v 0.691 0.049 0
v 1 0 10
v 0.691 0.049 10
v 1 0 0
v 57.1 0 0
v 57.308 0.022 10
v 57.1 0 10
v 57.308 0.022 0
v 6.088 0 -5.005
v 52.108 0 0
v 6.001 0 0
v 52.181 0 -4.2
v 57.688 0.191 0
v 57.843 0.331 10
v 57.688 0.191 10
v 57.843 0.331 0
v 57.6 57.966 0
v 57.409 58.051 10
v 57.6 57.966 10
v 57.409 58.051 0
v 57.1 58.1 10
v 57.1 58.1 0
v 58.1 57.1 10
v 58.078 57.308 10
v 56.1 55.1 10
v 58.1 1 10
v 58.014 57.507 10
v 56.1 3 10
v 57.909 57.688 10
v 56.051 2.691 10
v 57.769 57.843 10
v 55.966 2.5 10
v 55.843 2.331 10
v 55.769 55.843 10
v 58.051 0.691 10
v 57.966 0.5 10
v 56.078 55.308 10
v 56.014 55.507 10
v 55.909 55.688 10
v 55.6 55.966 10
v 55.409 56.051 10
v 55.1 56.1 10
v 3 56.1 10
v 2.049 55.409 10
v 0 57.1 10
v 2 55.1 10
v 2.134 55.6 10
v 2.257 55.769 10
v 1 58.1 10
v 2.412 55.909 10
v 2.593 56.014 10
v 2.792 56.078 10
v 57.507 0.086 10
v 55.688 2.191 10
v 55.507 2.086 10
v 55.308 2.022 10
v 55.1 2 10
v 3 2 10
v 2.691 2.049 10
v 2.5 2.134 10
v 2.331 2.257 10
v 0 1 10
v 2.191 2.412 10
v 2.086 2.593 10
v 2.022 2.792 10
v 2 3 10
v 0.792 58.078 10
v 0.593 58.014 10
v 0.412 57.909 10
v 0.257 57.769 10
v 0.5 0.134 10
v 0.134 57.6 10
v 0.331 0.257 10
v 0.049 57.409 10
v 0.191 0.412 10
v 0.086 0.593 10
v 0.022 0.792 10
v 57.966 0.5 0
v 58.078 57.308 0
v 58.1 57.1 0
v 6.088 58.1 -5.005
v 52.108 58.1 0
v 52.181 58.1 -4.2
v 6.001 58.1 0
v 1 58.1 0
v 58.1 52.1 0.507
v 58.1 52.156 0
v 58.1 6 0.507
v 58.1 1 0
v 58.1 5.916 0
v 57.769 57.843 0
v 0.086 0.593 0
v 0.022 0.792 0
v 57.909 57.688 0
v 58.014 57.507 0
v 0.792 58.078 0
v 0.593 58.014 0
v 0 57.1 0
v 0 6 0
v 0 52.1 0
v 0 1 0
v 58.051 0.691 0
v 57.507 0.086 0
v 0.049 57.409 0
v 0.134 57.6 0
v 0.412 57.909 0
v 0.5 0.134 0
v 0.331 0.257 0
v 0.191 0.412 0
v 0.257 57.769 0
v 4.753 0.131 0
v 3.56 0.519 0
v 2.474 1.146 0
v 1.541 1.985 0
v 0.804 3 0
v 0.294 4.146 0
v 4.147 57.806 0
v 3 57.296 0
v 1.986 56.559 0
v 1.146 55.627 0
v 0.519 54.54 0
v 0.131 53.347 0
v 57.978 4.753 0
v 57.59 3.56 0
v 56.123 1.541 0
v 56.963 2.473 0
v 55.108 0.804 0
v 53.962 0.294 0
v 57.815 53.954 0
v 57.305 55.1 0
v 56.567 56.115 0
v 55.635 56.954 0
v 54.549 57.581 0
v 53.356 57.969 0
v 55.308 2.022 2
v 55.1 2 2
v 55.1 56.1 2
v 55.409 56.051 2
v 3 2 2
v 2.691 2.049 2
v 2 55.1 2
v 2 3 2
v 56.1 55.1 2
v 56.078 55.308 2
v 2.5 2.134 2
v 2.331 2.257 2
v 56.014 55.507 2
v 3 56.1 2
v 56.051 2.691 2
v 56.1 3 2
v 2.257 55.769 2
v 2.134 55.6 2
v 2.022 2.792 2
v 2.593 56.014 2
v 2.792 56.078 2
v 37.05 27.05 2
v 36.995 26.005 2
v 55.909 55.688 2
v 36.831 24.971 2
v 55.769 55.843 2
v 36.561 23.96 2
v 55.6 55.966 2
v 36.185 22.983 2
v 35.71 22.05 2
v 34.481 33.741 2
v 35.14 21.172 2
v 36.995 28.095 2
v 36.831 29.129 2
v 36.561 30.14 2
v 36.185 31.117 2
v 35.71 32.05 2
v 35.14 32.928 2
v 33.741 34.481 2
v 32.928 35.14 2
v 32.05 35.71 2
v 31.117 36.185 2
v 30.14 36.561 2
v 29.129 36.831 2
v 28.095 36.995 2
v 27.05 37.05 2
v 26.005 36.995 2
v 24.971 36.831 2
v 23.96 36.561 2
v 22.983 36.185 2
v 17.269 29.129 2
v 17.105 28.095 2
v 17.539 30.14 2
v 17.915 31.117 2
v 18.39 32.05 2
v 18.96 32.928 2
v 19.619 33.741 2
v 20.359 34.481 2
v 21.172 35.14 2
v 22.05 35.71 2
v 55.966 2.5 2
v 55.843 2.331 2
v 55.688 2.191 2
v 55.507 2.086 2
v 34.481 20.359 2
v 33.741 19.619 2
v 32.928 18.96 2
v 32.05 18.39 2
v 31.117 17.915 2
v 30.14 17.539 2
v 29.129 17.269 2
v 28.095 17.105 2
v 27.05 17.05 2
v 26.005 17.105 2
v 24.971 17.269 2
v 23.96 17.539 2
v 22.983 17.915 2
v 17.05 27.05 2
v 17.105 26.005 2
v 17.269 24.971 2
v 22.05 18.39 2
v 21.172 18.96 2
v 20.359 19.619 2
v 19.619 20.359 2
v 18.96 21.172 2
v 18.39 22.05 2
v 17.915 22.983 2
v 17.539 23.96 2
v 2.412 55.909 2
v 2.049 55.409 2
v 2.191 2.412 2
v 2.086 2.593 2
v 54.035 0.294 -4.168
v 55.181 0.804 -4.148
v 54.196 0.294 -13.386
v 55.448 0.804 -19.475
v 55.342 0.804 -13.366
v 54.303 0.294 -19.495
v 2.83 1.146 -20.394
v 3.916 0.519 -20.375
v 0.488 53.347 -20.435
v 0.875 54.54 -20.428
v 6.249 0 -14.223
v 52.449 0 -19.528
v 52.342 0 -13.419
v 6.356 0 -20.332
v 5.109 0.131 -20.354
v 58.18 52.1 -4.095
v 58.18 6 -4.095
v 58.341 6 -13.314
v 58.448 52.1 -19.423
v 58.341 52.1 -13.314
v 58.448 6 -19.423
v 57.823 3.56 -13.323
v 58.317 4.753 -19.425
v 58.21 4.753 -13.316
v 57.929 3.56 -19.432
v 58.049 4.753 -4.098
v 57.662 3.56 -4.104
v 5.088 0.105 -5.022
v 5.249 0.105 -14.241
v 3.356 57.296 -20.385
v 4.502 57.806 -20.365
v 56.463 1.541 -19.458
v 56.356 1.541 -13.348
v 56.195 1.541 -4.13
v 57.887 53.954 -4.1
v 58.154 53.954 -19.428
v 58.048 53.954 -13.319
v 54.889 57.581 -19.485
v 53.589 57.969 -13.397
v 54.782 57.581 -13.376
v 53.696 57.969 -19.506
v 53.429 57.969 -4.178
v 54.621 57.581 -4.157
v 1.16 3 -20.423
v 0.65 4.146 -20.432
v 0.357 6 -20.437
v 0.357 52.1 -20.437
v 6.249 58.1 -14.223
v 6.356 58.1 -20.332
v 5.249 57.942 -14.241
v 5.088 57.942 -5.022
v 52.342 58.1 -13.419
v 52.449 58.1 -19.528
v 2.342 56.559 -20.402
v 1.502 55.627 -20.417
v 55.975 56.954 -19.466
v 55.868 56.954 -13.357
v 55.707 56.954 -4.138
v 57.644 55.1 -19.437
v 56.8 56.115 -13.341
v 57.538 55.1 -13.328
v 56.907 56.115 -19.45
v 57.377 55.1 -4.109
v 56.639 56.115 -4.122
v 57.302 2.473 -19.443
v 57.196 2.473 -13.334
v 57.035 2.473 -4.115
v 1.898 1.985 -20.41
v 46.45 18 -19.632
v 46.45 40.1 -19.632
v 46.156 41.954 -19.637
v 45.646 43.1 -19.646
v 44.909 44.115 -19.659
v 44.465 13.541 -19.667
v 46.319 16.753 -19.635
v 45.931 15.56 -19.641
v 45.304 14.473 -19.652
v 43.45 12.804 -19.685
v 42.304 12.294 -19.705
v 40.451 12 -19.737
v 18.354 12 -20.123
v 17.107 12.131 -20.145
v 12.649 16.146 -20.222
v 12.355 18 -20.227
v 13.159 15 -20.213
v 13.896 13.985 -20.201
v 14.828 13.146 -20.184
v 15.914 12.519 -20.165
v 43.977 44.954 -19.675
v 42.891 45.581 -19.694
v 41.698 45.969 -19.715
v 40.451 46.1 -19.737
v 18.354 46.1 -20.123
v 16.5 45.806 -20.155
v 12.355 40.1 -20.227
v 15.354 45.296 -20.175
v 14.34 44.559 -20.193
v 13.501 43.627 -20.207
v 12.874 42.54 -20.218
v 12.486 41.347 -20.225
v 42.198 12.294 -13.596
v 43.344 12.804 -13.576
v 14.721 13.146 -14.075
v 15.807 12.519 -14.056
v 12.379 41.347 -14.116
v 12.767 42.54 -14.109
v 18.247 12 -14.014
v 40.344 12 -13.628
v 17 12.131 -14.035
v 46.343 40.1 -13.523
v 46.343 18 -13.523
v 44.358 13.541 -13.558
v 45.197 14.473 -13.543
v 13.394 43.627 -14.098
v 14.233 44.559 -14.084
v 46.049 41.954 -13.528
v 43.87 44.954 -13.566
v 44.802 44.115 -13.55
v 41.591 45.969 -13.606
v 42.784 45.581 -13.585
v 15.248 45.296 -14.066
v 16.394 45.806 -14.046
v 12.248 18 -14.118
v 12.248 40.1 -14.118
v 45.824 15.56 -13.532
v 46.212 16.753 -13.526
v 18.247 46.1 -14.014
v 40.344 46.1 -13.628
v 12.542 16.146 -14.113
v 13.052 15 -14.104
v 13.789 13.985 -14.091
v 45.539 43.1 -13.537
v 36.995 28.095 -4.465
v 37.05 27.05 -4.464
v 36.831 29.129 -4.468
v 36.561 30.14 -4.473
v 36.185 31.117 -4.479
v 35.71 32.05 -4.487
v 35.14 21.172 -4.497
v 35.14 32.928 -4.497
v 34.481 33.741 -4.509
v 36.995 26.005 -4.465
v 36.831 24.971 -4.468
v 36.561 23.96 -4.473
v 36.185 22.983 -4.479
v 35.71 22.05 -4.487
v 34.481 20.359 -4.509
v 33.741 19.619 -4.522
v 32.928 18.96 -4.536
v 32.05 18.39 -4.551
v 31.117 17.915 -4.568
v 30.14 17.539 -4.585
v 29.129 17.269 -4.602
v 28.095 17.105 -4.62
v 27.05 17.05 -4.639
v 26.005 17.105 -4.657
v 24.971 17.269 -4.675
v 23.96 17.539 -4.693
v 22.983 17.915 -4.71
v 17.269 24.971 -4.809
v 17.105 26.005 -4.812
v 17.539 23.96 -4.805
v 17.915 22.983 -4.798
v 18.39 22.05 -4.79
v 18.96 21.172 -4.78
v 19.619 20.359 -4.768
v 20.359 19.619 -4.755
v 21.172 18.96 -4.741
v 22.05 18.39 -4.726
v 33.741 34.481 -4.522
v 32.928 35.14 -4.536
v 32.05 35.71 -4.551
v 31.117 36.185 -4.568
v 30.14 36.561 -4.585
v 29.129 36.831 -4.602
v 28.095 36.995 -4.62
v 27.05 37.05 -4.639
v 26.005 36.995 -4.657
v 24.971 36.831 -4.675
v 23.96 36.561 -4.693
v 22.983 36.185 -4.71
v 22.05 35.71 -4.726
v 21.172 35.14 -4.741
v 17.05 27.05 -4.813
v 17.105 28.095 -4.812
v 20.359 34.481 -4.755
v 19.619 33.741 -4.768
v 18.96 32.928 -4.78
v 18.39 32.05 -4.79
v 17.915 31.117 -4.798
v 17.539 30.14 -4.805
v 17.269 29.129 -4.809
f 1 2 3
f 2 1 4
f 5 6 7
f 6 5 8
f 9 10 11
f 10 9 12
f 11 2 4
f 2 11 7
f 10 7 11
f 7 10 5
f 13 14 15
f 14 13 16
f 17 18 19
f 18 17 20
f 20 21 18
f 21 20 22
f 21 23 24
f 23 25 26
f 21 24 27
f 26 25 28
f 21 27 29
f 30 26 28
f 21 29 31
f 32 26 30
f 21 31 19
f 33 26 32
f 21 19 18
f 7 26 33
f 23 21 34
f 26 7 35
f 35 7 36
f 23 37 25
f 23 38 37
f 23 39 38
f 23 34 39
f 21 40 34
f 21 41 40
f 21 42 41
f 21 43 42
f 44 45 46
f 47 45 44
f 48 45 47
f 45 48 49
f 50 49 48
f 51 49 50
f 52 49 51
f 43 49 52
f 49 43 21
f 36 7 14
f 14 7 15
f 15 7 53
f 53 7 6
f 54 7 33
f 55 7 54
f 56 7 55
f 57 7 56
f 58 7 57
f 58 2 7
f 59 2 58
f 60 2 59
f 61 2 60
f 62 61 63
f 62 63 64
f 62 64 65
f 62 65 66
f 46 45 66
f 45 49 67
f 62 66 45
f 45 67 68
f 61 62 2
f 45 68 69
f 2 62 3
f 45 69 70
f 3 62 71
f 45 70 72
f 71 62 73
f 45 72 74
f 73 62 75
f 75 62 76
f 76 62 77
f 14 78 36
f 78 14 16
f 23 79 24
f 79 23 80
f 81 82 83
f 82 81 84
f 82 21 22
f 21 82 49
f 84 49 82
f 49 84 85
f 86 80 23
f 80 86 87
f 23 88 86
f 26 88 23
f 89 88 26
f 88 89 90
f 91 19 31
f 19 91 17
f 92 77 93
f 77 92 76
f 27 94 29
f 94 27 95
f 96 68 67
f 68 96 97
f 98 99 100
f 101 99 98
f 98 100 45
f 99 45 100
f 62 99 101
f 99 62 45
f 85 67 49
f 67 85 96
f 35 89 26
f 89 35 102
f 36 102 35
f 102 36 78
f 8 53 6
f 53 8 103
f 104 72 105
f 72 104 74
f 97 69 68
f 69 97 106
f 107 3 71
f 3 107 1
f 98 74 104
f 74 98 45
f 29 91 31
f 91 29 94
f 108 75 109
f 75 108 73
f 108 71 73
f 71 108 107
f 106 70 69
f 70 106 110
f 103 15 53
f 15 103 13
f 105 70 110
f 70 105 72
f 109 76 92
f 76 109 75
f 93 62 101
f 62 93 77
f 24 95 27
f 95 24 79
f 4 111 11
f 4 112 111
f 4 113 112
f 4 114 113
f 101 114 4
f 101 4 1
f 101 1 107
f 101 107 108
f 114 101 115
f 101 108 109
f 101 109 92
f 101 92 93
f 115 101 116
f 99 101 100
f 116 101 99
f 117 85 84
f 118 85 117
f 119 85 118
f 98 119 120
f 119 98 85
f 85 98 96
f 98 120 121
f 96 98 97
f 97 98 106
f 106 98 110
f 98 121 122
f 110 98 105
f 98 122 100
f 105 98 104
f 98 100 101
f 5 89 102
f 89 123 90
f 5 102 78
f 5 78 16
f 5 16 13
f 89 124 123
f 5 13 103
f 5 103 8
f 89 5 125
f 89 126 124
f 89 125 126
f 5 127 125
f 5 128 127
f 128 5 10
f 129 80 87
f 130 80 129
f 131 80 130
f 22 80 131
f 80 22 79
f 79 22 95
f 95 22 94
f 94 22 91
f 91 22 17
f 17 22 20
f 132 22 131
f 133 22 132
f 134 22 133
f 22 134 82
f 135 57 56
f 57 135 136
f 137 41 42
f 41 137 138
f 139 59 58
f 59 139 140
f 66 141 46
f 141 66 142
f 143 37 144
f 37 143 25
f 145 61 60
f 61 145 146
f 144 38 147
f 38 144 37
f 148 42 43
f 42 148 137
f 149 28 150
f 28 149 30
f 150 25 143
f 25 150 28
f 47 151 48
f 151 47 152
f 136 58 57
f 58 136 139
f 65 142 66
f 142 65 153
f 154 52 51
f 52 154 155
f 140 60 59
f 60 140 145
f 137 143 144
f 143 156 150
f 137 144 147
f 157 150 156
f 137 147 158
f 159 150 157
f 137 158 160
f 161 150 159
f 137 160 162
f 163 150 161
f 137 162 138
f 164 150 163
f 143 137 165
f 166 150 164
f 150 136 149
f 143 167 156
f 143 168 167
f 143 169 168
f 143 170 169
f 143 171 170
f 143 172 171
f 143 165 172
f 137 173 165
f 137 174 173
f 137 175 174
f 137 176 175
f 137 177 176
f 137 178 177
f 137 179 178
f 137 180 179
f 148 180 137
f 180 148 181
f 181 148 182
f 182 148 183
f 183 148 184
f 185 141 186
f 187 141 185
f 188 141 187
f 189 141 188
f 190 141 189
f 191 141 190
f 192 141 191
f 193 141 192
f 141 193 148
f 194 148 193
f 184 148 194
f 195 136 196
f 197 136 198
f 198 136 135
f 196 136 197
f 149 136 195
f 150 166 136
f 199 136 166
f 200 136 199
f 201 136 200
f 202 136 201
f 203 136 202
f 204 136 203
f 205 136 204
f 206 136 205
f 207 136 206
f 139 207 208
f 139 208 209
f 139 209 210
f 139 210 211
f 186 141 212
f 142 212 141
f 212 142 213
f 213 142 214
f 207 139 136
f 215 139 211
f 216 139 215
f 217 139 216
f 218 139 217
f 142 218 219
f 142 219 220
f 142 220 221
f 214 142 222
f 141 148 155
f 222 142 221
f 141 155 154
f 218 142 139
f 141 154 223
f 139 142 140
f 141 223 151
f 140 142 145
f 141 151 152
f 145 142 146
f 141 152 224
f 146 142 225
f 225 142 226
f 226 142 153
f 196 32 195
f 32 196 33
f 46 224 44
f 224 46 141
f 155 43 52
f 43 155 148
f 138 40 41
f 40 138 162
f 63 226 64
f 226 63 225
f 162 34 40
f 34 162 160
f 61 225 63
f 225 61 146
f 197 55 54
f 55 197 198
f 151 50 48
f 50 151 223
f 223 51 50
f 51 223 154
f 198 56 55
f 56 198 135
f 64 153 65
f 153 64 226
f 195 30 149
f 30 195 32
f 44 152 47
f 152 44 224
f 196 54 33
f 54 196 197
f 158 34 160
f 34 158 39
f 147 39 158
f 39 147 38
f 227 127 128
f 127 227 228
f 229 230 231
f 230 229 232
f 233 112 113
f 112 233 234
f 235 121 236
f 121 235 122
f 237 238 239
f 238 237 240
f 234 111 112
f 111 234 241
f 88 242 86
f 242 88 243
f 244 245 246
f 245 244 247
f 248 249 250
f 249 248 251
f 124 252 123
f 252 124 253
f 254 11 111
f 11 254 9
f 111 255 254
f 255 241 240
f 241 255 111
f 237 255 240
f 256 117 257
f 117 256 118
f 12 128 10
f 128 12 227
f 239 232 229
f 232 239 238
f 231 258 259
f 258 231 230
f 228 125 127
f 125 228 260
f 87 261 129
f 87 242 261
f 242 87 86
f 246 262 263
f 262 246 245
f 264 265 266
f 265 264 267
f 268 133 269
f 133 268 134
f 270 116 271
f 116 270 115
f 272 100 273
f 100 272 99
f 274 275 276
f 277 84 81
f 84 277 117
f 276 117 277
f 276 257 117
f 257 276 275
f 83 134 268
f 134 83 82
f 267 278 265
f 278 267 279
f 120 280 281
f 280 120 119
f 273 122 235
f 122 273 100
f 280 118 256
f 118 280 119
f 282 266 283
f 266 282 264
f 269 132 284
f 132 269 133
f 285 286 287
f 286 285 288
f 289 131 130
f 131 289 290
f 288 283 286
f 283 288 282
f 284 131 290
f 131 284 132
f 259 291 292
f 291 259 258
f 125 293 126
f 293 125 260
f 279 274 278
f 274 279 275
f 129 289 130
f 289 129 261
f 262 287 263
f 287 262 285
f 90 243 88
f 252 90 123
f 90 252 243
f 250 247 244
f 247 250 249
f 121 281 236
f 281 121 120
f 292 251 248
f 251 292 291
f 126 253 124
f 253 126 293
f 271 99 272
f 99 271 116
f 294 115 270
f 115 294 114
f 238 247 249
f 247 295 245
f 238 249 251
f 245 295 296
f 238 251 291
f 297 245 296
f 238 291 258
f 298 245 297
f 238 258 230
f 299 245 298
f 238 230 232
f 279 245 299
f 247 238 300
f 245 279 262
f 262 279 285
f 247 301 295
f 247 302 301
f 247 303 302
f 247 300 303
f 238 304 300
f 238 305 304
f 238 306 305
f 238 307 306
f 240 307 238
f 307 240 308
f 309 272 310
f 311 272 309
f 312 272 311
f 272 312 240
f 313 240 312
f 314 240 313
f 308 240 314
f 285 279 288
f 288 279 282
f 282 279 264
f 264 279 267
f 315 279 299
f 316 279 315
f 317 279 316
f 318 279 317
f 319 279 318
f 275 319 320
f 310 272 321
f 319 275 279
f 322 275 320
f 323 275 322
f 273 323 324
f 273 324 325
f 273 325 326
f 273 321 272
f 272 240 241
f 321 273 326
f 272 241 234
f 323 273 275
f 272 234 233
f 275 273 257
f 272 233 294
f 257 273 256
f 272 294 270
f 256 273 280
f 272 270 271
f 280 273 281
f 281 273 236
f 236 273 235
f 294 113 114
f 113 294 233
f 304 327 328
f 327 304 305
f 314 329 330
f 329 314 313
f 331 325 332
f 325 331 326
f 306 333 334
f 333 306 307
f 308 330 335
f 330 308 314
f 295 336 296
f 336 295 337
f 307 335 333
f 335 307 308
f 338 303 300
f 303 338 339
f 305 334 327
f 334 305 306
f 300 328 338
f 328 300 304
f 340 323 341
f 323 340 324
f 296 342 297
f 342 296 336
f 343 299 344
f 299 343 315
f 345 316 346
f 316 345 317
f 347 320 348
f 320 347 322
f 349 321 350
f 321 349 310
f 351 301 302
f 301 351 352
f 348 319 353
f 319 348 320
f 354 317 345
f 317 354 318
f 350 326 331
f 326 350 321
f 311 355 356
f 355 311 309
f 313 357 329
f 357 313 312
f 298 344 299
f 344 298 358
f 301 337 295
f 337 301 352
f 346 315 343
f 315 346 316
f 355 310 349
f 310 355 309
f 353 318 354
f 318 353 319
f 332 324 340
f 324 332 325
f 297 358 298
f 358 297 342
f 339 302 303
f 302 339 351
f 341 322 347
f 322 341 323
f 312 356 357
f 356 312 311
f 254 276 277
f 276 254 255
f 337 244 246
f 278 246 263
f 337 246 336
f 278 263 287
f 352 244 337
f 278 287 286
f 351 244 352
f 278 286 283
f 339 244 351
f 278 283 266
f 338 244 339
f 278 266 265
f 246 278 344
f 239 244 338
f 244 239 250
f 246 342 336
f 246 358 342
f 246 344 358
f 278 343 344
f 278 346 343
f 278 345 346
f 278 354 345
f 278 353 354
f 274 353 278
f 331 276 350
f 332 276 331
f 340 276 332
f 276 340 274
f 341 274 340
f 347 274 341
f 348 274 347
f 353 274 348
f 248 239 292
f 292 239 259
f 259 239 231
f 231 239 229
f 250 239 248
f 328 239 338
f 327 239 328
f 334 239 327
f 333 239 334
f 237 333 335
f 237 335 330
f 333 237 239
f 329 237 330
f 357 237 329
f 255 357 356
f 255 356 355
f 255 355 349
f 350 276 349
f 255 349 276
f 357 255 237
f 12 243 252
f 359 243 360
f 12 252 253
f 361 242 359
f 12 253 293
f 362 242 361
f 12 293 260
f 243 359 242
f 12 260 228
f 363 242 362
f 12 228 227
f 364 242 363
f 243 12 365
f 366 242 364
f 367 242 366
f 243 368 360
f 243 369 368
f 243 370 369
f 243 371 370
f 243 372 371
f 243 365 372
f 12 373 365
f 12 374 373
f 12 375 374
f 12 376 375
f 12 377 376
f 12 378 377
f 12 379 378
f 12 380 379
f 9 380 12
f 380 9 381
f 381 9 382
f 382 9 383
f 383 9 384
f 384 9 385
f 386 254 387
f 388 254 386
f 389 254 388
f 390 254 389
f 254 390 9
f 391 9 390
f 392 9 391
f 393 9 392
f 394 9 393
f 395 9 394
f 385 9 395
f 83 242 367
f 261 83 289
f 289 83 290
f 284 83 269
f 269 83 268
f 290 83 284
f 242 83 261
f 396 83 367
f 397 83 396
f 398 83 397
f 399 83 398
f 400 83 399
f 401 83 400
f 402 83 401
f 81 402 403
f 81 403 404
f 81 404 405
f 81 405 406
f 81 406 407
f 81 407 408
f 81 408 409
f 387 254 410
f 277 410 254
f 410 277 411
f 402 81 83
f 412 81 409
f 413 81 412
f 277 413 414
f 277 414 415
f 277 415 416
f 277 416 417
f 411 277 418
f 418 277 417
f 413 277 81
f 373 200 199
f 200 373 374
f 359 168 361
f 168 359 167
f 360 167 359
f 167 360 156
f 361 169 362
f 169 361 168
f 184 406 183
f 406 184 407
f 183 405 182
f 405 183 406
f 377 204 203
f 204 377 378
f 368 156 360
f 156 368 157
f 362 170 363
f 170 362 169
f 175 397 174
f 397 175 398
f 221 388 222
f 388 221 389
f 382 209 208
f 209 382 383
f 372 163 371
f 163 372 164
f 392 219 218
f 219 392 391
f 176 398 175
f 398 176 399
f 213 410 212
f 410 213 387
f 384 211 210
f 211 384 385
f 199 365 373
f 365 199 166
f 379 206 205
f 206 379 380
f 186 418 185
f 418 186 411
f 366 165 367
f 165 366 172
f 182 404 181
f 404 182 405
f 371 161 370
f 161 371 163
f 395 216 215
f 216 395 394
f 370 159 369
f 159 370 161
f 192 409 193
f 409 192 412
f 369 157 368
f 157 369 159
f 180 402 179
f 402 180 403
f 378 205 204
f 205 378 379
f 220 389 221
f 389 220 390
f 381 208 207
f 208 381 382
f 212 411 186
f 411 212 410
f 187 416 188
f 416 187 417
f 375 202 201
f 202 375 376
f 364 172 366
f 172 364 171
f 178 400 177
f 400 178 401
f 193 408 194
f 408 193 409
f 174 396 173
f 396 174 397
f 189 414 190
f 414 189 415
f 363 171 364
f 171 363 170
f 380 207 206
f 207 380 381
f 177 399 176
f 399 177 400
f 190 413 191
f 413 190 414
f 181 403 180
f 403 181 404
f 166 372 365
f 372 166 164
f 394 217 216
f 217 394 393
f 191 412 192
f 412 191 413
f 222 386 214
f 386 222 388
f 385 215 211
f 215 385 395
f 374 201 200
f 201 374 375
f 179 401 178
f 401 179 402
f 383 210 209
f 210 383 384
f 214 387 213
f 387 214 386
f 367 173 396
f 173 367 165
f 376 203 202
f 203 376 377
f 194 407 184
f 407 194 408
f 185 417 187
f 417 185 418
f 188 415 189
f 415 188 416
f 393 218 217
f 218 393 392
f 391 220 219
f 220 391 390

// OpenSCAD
// file: myTools.scad
module tube (r = 0, d = 0, l = 0, thick = 0, centered = true, taper_pct = 0, circlip = false) // r=radius d=dia l=length 
{
    assert( r != 0 || d != 0, "specify one of radius or diameter");
    assert( l != 0 , "tube: need length 'l' to be non zero");
    assert( thick != 0, "wall thickness cannot be zero");

    punch = $preview ? .2 : 0; // stop funny view artifact

    dia = r ? r * 2 : d;

    od = ((thick > 0) ? dia + thick * 2 : dia);
    id = (thick > 0) ? dia             : dia  + thick *2; 

    
    
    if (thick > 0)
        echo ("tube\tMIN id = ", id, "od = ", od, "wall = ", thick, "center= ", centered);
    else
        echo ("tube\tMAX od = ", od, "id = ", id, "wall = ", thick, "center= ", centered);

    echo ("tube\tHeigth = ", l);
        
    if (taper_pct != 0)
    {
        echo ("tube\t*** OD expanded by ", taper_pct, "%, : bottom od = ", od * (1. +taper_pct/100), "top od = ", od);
    }
    
    assert(dia || dia < 0, "tube : missing r or d ");
    
    // if taper_pct specified, the base will always be closest to 0,0,0
    translate([ 0, 0, taper_pct == 0 ? 0: centered ? l/2:l  ])
    rotate([0, taper_pct == 0 ? 0 : 180, 0 ])

    difference()
    {
        // make a reese's cup
        {
            color("YELLOW", .3)
            linear_extrude(height= l, scale = 1 + taper_pct/100)
                difference()
                {
                    circle(d = od);
                    circle(d = .5);
                }
        }
    
     // hollow out reessed cup
     color("GREEN")
     translate([0, 0, -punch/2])
     linear_extrude(height= l+ punch*2, $fn=100)
     {
        circle(d = id);
        if (circlip) #square([1 + punch, od ]);
     }
    
    }
}
        
module abox (dims, thick = 0, centered = true, bRoundOut = true, bRoundIn = false, bSolid = false)
{
    punch = $preview ? .1 : 0; // stop funny view artifact
    
    assert(thick != 0, "Thick must be specified. +=outside dim, -= inside dims");
    assert(dims.z > thick, "wall thickness too large for depth of box");

    wall2 = abs(thick) * 2; // 2 walls in each direction
    wall = wall2 / 2;
    
    // box either grows inward (thick < 0) or outward (thick > 0)  from dims
    fat = dims + [ wall2, wall2, wall];
    thin = dims - [ wall2, wall2, wall];
    
    offset = (thick > 0 && centered == false) ? wall : 0;
    
    //echo ("abox : adjusting x,y,z by ", offset, " to move origin from  center to 0,0,0");
    translate( [ centered ? 0 : dims.x /2 + offset, centered ? 0 : dims.y /2 + offset, centered ? 0 : dims.z /2 + offset/2]) 
    {
        if (thick > 0)
        {   
            // wall grows outwards from users dim
            echo ("making a box, MAX INSIDE dim = ", dims, "a wall=", thick, "mm ... max outside = ", fat, " mm");
        }
        else
        {
            // wall grows inward from users dime
            echo ("making a box, MAX OUTSIDE dim = ", dims, "a wall=", thick, "mm ... min inside = ", thin, " mm");
        }
        
        // linear extrude alway works in the positive x/y plane an goes upward.
        // after calc, re-center about 0,0,0 where a centered cube would be
        
        translate([ 0, 0, thick > 0  ? -fat.z/2 : -dims.z/2 ])
        difference()
        {
            router_outside = bRoundOut ? wall : 0;
            x = thick > 0  ? fat.x : dims.x;
            y = thick > 0  ? fat.y : dims.y;

            color("YELLOW", .2)

            // using 'offset' it will add r on all dimensions, then round., so it you want
            //      now you have fatter perimeter than you stared with, but corners are round.
            //      compensate by shrinking dimension by r, calling offset then will put it back include      for bRoundOut, subtract 'r' knowing expansion will happen.

            linear_extrude(thick > 0  ? fat.z : dims.z)
            if (bRoundOut)
            {
                offset( r= wall/2, $fn=30)
                square( [x - router_outside, y - router_outside], true);
            }
            else square( [x - router_outside, y - router_outside], true);
           
            if (bSolid == false)
            {
                // punching out inside. its either dims or thin.
                router_inside = bRoundIn ? wall : 0;
                xi = thick > 0  ? dims.x : thin.x;
                yi = thick > 0  ? dims.y : thin.y;

                color("GREEN")
                translate([ 0,0, wall]) // make sure the box has a bottom.
                linear_extrude(thick > 0  ? fat.z - wall + punch : dims.z - wall + punch)
                if (bRoundIn) 
                {
                    offset( r= wall/2, $fn=30)
                    square( [ xi - router_inside, yi - router_inside], true);
                }
                else
                    square( [ xi, yi], true);
            }
        }
    }
 }


// 50x25x10 box walls grow inward (-2). on center origin midpoint
// rounded outside (default), sharp corner inside(default), centered about 0,0,0
//color("GREEN", .9)
//abox([50,25, 10], -2, true); 

/*
// 50x25x10 box walls grow inward (-2). on center origin midpoint
// sharp outside corners, rounded inside corners. Sit on x,y plane
color("BLUE", .9)
abox([50,25, 10], -2, bRoundOut=false, bRoundIn=true, centered = false);  // 50x25x10 box inside dim origin has 0,0

// 50x25x10 box walls grow inward (-2). on center origin midpoint
// sharp corners inside and out. sits on x,y plane
color("GREY", .9)//
translate([ 55, 0, 0])      
abox([50,25, 10], +2, bRoundOut=false, bRoundIn=false, false); // 50x25x10 box outside dim origin is 0,0
*/

// 50x25x10 box walls grow inward (-2). on center origin midpoint
// round corners outside and SOLID
color("BLUE", .9)//
translate([ 55, 0, 0])      
abox([50,25, 10], +2, bRoundOut=true, bRoundIn=false, false, bSolid = true); // 50x25x10 box outside dim origin is 0,0


//translate ([-30,-30, 0])
{
/*
    // tube outer dia  20, inner dia = (20 - 8)
    color("PINK")
    tube (d = 20, l = 20, thick = -8, centered = false);

    // tube, inner dia = (2* 10), outer dia = ((2*10) + 2) 
    color("PURPLE", .3)
    tube (r = 10, l = 20, thick = +2, centered= true);
*/

    tube (d = 60, l = 20, thick = -6, centered = false);

    translate([0, 0, 50])
    tube (d = 60, l = 20, thick = -6, centered = false, taper_pct = 20, circlip = true);
    //color("GREEN")
    //tube (d = 20, l = 20, thick = -2, centered = false, taper = 10, circlip = true);


}
// main file
//use <otherPeoplesWork/threads-scad/threads.scad>
use <myTools.scad>
punch = $preview ? 2: 0;

x = 54.1;
y = x;
z = 8;

wall = +2;


/* [Hidden] */
$fn=60;   //circle quantize 360/10=36 degrees per side
M5_outside = [ x, y, 8];
M5_middle = [ x/2, y/2, z/2];

module hi_level()
{
    abox( M5_outside, thick = +2, bRoundOut=true, bRoundIn=true, centered = false);
    HOOK_THICK = 3;
    HOOK_OPEN = 8.22 + .5;
    HOOK_outside = [ x, y, HOOK_OPEN *2 + HOOK_THICK];

    rotate([0, 179, 0]) // 179 tilt 1 degree in 
    translate([-(x + wall*2), 0, 0])
    difference()
    {
        color("GREEN")
        abox( HOOK_outside + [ wall *2, wall*2, 0] , thick= -12, bRoundOut=true, bRoundIn=true, centered = false);  // 50x25x10 box inside dim origin has 0,0

        translate([-5.,-.5 , HOOK_outside.z/4])
        color("RED")
        scale([1,1,.5])
        #cube(HOOK_outside + [wall *2  , wall *2 + 1 , -2], center = false);
        
        
    }
 }
 
 difference()
 {
    hi_level();
    translate(M5_middle + [ 0, 0, -25])
    #cylinder(h = 40, d= 20);
 }
